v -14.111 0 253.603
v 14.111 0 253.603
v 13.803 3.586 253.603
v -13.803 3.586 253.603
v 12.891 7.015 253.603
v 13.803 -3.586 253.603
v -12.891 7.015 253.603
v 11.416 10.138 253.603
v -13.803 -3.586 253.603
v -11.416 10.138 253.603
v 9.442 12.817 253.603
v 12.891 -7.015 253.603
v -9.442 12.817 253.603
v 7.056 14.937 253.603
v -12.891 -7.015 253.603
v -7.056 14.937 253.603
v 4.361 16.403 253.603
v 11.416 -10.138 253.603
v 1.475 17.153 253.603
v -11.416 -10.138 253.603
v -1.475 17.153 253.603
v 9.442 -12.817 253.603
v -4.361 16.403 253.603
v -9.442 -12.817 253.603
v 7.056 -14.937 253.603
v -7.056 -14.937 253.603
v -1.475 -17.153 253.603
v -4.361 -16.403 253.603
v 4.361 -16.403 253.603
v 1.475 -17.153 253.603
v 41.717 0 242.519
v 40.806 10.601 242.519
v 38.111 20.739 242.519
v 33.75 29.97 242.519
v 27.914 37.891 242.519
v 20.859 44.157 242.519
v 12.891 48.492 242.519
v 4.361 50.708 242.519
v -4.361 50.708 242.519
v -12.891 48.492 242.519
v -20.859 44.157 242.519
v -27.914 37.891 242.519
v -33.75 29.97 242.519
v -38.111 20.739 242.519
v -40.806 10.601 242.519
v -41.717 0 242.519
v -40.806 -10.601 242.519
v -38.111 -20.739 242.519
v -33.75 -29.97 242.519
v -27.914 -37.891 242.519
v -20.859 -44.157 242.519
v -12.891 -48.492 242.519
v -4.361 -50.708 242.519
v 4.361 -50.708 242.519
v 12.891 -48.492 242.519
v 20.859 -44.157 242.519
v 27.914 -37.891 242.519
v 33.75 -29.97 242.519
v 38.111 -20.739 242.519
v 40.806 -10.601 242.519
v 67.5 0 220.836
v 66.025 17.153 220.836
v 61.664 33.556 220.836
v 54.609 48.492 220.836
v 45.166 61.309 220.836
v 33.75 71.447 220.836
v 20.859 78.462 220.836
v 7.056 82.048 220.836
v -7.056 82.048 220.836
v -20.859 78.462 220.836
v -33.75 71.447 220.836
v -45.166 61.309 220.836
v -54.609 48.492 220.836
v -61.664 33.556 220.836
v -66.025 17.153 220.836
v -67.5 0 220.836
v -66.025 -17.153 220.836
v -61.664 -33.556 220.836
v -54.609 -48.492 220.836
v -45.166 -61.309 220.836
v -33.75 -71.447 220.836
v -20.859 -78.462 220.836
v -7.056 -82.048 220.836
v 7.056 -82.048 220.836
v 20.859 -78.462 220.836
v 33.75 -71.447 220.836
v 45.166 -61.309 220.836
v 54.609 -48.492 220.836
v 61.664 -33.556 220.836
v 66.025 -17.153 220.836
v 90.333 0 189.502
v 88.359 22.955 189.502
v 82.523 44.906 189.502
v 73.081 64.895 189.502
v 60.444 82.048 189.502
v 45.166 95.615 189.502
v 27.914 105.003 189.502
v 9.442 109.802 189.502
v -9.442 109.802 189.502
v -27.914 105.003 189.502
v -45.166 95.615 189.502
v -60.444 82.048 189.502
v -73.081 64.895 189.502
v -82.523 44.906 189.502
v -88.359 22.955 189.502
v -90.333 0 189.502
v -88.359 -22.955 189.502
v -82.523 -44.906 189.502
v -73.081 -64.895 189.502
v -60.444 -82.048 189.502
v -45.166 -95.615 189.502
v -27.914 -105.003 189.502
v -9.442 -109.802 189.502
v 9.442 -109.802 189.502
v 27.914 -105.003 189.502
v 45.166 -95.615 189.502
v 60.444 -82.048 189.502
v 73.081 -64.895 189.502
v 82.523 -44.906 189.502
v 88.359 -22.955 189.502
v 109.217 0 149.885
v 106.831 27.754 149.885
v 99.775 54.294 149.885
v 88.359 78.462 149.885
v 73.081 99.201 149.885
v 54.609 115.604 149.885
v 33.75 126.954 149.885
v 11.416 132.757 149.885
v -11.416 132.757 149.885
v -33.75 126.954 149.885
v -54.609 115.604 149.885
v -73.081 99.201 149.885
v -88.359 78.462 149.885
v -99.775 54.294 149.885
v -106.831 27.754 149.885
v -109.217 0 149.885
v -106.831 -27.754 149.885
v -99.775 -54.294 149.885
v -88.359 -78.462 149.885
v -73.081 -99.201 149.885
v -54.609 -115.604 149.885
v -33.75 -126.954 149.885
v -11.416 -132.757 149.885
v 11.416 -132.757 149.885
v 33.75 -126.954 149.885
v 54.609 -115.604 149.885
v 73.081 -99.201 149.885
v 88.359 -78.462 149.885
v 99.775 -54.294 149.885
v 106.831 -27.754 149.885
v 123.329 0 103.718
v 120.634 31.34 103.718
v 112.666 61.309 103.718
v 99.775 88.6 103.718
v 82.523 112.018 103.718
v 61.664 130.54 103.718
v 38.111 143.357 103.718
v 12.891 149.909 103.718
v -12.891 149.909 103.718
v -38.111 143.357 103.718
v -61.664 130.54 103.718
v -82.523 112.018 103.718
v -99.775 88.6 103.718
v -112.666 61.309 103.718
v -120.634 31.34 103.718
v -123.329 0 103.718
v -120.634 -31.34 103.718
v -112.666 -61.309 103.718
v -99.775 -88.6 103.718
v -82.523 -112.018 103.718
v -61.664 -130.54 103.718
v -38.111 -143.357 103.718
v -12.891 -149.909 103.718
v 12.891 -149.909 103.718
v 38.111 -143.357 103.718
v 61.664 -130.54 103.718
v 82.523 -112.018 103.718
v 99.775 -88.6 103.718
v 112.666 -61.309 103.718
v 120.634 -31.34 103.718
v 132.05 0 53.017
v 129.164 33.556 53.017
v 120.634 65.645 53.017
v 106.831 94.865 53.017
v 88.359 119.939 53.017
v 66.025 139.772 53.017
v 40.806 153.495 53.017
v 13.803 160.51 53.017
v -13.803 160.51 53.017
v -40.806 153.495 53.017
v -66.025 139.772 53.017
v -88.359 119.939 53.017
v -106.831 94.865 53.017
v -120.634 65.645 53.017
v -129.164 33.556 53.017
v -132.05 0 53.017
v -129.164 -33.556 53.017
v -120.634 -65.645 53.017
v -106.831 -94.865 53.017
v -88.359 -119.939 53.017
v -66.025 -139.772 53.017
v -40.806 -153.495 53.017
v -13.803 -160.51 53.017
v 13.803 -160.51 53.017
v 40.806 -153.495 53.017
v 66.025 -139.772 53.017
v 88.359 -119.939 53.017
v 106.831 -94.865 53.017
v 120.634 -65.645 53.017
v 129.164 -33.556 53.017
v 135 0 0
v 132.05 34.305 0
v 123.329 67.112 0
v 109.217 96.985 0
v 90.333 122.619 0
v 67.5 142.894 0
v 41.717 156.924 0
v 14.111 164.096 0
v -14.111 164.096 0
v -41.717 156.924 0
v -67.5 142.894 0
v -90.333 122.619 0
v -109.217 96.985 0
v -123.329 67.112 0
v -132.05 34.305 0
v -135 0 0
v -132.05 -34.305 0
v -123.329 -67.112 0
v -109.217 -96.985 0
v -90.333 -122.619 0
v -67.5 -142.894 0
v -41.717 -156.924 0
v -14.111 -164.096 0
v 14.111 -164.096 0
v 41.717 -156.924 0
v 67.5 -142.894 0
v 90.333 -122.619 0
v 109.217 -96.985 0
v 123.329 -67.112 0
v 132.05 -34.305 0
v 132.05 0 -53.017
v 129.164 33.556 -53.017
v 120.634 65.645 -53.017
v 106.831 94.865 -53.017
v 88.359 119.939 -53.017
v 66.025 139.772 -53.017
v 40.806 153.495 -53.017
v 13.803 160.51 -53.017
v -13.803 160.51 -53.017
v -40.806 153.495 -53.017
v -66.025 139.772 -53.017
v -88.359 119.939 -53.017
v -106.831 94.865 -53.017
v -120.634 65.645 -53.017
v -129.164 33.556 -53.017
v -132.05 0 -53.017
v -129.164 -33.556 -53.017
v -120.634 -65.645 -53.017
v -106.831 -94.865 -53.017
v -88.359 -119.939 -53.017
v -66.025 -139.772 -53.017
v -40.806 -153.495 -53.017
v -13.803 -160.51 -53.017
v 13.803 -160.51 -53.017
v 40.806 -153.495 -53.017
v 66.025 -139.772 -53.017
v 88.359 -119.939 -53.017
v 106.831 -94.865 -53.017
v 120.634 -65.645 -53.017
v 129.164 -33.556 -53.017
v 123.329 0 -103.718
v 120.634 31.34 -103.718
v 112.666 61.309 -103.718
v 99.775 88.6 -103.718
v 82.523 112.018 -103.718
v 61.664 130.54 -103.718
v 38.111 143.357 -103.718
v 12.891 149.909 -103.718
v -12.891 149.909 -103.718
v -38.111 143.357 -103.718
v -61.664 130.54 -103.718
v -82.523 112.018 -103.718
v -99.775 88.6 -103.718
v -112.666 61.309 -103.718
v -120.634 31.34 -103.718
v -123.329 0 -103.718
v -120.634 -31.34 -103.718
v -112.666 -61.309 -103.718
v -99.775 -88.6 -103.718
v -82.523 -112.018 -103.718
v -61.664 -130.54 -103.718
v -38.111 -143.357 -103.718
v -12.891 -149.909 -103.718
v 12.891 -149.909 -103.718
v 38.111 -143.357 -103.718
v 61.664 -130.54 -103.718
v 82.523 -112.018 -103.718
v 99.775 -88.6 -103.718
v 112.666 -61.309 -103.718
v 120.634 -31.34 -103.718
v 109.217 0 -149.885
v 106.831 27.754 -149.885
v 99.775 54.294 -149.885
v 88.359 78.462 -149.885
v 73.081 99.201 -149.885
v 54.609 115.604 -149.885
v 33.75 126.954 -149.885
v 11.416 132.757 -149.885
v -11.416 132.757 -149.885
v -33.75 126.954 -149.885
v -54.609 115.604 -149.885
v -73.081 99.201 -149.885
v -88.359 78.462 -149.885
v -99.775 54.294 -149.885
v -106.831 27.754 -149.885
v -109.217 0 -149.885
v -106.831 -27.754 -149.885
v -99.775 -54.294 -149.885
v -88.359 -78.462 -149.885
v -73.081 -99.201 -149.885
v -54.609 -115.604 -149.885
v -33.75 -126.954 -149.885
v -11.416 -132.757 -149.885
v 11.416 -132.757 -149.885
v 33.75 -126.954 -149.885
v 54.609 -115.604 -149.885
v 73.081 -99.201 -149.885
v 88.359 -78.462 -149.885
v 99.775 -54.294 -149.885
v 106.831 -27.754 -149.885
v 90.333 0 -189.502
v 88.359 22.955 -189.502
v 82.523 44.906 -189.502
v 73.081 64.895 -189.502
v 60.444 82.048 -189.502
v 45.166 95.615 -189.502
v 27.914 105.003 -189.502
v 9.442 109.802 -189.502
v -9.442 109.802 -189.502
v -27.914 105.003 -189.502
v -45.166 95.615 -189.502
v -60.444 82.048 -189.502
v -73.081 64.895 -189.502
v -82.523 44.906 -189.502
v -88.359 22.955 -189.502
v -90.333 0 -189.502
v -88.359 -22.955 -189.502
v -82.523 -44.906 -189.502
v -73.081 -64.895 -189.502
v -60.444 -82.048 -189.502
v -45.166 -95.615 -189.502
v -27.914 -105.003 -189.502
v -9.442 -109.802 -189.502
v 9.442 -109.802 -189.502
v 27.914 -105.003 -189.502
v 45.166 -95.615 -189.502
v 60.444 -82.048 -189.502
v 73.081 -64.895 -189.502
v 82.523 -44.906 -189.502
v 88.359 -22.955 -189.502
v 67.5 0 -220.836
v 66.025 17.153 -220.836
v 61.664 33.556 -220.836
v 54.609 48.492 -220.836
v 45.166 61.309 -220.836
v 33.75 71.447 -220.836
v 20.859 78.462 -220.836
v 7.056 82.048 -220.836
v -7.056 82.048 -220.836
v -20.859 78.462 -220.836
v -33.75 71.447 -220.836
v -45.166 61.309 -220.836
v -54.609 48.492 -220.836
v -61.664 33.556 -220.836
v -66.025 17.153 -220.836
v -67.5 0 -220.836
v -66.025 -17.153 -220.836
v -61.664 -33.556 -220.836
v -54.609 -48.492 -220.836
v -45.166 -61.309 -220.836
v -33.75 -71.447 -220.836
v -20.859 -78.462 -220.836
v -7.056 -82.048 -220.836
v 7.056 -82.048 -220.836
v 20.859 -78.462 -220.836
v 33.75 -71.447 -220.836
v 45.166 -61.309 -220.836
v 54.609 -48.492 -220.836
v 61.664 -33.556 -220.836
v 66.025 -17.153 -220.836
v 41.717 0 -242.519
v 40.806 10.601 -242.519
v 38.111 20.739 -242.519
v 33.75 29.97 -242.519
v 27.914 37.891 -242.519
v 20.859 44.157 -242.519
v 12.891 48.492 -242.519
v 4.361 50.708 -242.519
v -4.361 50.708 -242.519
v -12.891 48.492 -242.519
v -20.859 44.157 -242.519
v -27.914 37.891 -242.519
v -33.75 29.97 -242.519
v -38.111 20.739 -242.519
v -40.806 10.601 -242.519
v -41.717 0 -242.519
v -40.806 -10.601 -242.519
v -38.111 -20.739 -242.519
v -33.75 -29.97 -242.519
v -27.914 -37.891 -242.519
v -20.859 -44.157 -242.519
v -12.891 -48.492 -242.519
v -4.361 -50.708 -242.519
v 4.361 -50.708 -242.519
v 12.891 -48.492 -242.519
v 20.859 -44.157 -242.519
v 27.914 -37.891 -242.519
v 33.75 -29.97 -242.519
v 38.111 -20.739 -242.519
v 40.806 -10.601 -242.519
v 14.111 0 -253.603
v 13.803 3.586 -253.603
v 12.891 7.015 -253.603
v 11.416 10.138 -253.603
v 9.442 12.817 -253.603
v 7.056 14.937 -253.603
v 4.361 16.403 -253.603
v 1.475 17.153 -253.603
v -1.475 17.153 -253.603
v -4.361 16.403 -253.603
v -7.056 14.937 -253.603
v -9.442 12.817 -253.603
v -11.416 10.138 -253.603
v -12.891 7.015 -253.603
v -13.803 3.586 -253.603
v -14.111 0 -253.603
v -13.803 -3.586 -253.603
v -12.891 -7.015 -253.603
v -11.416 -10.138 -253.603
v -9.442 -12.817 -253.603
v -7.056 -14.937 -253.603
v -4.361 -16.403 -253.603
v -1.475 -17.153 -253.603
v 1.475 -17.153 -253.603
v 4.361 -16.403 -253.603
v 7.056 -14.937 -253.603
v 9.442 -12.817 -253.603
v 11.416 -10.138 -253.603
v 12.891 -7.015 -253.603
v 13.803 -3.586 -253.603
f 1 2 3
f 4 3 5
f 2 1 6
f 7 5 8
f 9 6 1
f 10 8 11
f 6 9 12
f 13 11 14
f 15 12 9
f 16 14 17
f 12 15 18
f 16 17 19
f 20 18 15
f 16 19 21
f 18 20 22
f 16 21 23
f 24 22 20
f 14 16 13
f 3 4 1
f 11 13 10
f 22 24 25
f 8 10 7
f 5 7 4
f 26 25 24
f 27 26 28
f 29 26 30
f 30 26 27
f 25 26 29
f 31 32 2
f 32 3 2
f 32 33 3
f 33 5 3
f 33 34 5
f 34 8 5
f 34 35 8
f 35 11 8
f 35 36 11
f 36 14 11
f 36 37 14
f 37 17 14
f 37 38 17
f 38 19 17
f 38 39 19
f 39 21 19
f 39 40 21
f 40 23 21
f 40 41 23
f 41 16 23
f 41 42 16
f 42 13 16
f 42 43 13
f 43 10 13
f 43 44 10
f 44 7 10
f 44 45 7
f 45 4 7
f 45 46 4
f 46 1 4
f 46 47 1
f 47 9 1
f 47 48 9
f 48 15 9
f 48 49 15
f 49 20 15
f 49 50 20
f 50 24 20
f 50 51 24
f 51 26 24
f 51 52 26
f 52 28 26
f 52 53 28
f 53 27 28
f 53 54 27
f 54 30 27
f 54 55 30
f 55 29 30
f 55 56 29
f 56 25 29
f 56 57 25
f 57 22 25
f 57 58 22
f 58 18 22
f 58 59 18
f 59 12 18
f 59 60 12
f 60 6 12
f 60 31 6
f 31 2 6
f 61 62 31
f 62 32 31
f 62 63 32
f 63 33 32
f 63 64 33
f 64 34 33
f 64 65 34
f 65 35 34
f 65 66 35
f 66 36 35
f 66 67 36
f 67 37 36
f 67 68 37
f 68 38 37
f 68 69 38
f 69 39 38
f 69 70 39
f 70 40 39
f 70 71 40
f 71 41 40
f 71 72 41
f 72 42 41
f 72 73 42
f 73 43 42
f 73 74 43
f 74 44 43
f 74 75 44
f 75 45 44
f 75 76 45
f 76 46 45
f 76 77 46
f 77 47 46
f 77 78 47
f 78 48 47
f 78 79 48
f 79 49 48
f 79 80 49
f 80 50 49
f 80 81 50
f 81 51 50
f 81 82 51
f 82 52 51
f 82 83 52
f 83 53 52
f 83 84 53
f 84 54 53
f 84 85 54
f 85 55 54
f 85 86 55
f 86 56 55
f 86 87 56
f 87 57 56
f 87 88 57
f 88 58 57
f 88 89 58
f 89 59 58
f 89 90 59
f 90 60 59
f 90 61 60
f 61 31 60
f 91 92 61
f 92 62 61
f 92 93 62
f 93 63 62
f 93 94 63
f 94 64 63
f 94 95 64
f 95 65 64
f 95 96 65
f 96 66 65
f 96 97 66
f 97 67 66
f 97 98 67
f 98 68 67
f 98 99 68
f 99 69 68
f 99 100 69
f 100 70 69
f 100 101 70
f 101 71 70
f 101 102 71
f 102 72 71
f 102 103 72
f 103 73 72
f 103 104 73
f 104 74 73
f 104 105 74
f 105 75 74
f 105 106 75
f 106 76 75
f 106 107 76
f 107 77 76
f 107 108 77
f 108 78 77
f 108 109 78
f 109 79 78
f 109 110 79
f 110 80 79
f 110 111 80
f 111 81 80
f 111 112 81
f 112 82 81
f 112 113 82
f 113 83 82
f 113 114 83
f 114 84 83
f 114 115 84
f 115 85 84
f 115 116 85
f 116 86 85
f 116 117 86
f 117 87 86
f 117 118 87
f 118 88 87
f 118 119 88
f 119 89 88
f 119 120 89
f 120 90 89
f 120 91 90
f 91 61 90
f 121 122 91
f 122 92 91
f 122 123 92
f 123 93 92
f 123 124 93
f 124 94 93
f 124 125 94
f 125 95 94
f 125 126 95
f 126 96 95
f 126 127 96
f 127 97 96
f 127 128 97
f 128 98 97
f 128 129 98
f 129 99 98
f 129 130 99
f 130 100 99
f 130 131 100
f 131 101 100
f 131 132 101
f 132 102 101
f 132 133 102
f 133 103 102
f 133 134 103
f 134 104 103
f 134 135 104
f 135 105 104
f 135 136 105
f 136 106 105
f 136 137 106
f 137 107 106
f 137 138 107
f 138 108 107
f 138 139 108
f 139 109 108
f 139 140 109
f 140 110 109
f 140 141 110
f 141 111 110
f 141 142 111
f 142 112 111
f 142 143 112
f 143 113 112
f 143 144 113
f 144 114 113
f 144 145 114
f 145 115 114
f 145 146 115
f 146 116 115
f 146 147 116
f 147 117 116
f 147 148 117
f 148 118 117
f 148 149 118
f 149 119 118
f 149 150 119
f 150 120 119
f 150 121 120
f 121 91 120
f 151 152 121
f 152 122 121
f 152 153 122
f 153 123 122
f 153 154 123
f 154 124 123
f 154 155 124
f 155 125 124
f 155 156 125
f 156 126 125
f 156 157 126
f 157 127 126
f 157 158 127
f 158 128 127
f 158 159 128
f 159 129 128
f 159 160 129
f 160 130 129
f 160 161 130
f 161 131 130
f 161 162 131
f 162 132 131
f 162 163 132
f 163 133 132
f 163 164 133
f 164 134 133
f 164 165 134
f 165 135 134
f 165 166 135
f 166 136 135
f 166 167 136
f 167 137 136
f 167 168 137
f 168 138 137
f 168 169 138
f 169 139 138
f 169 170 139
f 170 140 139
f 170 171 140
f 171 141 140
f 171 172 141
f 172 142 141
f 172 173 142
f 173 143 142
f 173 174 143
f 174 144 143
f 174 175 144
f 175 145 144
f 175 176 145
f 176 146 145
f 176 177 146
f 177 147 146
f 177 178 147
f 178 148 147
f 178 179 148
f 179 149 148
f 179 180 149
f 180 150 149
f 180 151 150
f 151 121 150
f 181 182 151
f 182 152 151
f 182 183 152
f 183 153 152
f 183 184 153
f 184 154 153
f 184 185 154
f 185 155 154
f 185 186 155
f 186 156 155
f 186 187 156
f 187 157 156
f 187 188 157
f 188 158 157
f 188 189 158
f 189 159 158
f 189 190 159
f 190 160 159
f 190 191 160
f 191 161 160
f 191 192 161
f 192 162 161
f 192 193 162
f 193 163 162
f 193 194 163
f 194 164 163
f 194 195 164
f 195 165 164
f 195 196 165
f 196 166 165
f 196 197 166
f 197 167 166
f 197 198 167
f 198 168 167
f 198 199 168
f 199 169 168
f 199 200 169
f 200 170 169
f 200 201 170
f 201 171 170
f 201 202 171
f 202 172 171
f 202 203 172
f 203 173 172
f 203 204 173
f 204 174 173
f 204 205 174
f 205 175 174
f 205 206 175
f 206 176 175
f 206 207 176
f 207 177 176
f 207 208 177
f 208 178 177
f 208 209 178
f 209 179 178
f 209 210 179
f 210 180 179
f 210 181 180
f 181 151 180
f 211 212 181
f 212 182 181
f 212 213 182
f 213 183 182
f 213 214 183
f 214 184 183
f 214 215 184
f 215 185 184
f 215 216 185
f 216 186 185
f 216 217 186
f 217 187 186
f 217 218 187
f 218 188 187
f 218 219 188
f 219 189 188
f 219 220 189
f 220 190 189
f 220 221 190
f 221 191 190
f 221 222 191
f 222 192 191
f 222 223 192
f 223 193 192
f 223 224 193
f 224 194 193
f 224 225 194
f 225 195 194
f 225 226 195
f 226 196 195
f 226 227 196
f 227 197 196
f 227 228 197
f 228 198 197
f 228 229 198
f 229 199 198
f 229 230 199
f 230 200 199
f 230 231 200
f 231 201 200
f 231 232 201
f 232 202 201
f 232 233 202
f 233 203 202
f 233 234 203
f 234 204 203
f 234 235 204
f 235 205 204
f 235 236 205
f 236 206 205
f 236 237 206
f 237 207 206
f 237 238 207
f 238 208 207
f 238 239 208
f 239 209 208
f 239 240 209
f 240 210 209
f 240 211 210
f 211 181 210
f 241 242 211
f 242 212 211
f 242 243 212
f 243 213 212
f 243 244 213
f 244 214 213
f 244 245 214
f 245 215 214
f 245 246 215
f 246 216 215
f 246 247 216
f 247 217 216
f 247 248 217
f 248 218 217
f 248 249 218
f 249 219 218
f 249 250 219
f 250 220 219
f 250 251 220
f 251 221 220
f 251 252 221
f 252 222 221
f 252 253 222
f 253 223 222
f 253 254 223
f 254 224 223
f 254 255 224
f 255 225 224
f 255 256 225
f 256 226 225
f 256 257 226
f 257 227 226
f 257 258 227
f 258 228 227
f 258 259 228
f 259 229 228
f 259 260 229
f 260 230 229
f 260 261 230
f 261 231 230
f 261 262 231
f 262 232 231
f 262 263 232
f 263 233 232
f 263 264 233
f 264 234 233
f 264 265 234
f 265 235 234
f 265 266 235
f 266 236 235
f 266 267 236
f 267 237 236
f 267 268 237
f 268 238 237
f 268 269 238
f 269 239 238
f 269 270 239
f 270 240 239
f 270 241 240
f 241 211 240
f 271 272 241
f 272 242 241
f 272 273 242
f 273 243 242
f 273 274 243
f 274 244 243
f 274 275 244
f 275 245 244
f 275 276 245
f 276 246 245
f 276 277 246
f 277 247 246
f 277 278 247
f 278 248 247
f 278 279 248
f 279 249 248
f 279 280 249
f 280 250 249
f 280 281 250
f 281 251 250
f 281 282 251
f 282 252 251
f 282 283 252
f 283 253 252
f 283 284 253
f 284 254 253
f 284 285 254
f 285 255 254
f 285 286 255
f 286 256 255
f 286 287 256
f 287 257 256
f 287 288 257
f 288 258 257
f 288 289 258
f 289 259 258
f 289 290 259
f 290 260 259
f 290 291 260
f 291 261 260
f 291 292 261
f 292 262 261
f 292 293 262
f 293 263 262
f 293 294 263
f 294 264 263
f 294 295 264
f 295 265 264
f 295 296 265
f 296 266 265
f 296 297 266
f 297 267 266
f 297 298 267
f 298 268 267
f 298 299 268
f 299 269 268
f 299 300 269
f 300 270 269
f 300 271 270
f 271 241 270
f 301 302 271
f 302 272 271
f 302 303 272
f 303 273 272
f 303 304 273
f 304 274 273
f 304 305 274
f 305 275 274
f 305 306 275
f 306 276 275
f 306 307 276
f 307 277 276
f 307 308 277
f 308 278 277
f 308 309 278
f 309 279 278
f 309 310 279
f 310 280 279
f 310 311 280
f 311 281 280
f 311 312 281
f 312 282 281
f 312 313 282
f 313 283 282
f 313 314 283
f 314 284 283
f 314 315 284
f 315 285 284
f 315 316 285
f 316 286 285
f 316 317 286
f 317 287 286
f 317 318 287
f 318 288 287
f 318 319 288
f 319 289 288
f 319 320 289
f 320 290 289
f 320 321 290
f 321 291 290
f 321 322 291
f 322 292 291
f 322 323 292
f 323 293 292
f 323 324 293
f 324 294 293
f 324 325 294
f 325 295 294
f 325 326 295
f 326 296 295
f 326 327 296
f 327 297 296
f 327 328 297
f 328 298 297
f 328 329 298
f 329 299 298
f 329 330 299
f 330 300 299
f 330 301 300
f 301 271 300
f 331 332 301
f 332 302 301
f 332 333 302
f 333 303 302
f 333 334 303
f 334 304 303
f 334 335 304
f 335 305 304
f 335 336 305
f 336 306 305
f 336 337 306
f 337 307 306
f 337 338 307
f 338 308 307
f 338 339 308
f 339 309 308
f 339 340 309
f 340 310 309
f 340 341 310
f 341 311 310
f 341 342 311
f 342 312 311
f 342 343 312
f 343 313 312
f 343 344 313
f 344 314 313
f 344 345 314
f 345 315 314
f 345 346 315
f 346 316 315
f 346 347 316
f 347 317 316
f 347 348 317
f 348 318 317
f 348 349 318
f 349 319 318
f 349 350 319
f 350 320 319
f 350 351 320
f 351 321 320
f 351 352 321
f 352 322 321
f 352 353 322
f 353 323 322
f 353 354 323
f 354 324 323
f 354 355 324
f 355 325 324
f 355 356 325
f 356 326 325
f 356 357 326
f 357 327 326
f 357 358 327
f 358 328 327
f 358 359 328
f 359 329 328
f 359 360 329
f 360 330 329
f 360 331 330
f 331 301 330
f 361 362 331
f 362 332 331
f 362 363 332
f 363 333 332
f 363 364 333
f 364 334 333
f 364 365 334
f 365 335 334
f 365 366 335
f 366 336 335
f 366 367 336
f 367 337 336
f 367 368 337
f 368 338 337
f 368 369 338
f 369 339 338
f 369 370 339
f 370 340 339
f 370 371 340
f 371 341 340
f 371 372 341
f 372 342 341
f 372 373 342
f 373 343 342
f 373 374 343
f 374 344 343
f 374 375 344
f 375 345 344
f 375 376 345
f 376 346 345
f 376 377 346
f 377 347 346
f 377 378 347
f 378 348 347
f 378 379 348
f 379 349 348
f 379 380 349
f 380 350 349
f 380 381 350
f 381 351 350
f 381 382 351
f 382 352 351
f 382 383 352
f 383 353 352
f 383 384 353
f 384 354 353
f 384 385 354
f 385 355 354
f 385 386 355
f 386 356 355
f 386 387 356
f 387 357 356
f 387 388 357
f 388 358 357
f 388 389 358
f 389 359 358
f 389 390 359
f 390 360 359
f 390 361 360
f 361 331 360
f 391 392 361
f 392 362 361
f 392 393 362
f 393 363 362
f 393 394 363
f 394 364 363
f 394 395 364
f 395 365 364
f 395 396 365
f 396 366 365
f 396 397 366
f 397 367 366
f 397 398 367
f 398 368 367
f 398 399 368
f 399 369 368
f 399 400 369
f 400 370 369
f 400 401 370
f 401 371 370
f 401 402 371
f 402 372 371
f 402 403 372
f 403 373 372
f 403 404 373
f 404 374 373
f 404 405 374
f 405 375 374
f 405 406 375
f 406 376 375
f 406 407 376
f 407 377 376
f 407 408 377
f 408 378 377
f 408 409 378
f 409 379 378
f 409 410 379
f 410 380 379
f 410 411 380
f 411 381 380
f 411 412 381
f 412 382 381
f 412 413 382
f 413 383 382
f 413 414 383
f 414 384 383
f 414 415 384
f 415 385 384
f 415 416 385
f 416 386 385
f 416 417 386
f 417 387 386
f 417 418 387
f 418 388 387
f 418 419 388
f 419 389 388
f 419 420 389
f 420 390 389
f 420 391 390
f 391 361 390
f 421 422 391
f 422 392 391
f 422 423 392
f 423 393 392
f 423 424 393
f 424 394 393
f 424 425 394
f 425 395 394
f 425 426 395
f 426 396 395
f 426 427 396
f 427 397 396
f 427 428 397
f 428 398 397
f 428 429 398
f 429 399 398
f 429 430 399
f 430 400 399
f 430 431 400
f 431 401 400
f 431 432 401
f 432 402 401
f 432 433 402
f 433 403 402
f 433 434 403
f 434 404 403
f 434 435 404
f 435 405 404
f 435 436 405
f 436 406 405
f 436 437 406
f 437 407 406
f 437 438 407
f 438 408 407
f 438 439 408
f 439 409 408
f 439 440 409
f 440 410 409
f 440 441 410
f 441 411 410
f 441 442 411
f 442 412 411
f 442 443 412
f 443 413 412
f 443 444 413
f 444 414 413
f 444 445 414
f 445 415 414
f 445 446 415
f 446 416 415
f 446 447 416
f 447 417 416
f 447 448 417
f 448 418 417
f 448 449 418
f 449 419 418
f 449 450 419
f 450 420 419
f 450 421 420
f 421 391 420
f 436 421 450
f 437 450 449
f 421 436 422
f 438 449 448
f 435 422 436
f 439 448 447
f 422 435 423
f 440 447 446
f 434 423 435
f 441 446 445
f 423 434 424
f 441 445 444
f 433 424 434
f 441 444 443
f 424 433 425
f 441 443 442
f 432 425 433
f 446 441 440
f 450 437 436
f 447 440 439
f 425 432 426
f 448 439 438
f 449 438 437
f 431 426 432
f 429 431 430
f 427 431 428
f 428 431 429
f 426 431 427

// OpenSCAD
// Generated by SolidPython 1.0.1 on 2020-07-29 00:46:48


scale(v = [9, 11, 17]) {
	sphere(r = 15);
}
/***********************************************
*********      SolidPython code:      **********
************************************************
 
# import packages: SolidPython
from solid import *
from solid.utils import *
from itertools import chain, combinations, permutations


class Resize:

    def __init__(self, scad_file):
        self.scad_file = scad_file
        #self.scad_file = import_scad(scad_file)
        # cone/cylinder param:
        self.r1 = 0
        self.r2 = 0
        self.h = 0
        # rectangular prism param:
        self.w = 0
        self.l = 0
        # ellipse param:
        self.r = 0

    # import OpenScad code (file name corresponds to shape)


    # classify shape + parameters
    def assign(self, param1, param2, param3):
        if self.scad_file == 'cone.scad':
            self.r1 = param1
            self.r2 = param2
            self.h = param3
        elif self.scad_file == 'cylinder.scad':
            self.r1 = param1
            self.r2 = param2
            self.h = param3
        elif self.scad_file == 'rectangularPrism.scad':
            self.h = param1
            self.l = param2
            self.w = param3
        else:
            self.r = param1
            self.h = param2

    # resize parameters
    def iterate(self):
        x = range(3, 20, 2)
        i = 1
        if self.scad_file == 'cone.scad':
            tempList = list(permutations(x, 2))
            for temp in tempList:
                param1 = temp[0]
                param2 = temp[1]
                filepath = 'produced_scad_files/' + 'cone' + str(param1) + '_' + str(param2) + '_' + '.scad'
                scad_render_to_file(cylinder(h=param1, r1=param2, r2=0), filepath)

        elif self.scad_file == 'cylinder.scad':
            tempList = list(permutations(x, 3))
            for temp in tempList:
                param1 = temp[0]
                param2 = temp[1]
                filepath = 'produced_scad_files/' + 'cylinder' + str(param1) + '_' + str(param2) + '_' + '.scad'
                scad_render_to_file(cylinder(h=param1, r1=param2, r2=param2), filepath)

        elif self.scad_file == 'rectangularPrism.scad':
            tempList = list(permutations(x, 3))
            for temp in tempList:
                param1 = temp[0]
                param2 = temp[1]
                param3 = temp[2]
                filepath = 'produced_scad_files/' + 'rectangularPrism' + str(param1) + '_' + str(param2) + '_' + str(
                    param3) + '.scad'
                scad_render_to_file(cube(size=(param1, param2, param3)), filepath)

        elif self.scad_file == 'ellipse.scad':
            tempList = list(permutations(x, 4))
            for temp in tempList:
                param1 = temp[0]
                param2 = temp[1]
                param3 = temp[2]
                param4 = temp[3]
                filepath = 'produced_scad_files/' + 'ellipse' + str(param1) + '_' + str(param2) + '_' + str(param3) + '_' + str(param4) + '.scad'
                scad_render_to_file(scale([param1, param2, param3])(sphere(r=param4)), filepath)

    def render_to_scadfile(self):
        scad_render_to_file(scad, 'example.scad') 
 
************************************************/
